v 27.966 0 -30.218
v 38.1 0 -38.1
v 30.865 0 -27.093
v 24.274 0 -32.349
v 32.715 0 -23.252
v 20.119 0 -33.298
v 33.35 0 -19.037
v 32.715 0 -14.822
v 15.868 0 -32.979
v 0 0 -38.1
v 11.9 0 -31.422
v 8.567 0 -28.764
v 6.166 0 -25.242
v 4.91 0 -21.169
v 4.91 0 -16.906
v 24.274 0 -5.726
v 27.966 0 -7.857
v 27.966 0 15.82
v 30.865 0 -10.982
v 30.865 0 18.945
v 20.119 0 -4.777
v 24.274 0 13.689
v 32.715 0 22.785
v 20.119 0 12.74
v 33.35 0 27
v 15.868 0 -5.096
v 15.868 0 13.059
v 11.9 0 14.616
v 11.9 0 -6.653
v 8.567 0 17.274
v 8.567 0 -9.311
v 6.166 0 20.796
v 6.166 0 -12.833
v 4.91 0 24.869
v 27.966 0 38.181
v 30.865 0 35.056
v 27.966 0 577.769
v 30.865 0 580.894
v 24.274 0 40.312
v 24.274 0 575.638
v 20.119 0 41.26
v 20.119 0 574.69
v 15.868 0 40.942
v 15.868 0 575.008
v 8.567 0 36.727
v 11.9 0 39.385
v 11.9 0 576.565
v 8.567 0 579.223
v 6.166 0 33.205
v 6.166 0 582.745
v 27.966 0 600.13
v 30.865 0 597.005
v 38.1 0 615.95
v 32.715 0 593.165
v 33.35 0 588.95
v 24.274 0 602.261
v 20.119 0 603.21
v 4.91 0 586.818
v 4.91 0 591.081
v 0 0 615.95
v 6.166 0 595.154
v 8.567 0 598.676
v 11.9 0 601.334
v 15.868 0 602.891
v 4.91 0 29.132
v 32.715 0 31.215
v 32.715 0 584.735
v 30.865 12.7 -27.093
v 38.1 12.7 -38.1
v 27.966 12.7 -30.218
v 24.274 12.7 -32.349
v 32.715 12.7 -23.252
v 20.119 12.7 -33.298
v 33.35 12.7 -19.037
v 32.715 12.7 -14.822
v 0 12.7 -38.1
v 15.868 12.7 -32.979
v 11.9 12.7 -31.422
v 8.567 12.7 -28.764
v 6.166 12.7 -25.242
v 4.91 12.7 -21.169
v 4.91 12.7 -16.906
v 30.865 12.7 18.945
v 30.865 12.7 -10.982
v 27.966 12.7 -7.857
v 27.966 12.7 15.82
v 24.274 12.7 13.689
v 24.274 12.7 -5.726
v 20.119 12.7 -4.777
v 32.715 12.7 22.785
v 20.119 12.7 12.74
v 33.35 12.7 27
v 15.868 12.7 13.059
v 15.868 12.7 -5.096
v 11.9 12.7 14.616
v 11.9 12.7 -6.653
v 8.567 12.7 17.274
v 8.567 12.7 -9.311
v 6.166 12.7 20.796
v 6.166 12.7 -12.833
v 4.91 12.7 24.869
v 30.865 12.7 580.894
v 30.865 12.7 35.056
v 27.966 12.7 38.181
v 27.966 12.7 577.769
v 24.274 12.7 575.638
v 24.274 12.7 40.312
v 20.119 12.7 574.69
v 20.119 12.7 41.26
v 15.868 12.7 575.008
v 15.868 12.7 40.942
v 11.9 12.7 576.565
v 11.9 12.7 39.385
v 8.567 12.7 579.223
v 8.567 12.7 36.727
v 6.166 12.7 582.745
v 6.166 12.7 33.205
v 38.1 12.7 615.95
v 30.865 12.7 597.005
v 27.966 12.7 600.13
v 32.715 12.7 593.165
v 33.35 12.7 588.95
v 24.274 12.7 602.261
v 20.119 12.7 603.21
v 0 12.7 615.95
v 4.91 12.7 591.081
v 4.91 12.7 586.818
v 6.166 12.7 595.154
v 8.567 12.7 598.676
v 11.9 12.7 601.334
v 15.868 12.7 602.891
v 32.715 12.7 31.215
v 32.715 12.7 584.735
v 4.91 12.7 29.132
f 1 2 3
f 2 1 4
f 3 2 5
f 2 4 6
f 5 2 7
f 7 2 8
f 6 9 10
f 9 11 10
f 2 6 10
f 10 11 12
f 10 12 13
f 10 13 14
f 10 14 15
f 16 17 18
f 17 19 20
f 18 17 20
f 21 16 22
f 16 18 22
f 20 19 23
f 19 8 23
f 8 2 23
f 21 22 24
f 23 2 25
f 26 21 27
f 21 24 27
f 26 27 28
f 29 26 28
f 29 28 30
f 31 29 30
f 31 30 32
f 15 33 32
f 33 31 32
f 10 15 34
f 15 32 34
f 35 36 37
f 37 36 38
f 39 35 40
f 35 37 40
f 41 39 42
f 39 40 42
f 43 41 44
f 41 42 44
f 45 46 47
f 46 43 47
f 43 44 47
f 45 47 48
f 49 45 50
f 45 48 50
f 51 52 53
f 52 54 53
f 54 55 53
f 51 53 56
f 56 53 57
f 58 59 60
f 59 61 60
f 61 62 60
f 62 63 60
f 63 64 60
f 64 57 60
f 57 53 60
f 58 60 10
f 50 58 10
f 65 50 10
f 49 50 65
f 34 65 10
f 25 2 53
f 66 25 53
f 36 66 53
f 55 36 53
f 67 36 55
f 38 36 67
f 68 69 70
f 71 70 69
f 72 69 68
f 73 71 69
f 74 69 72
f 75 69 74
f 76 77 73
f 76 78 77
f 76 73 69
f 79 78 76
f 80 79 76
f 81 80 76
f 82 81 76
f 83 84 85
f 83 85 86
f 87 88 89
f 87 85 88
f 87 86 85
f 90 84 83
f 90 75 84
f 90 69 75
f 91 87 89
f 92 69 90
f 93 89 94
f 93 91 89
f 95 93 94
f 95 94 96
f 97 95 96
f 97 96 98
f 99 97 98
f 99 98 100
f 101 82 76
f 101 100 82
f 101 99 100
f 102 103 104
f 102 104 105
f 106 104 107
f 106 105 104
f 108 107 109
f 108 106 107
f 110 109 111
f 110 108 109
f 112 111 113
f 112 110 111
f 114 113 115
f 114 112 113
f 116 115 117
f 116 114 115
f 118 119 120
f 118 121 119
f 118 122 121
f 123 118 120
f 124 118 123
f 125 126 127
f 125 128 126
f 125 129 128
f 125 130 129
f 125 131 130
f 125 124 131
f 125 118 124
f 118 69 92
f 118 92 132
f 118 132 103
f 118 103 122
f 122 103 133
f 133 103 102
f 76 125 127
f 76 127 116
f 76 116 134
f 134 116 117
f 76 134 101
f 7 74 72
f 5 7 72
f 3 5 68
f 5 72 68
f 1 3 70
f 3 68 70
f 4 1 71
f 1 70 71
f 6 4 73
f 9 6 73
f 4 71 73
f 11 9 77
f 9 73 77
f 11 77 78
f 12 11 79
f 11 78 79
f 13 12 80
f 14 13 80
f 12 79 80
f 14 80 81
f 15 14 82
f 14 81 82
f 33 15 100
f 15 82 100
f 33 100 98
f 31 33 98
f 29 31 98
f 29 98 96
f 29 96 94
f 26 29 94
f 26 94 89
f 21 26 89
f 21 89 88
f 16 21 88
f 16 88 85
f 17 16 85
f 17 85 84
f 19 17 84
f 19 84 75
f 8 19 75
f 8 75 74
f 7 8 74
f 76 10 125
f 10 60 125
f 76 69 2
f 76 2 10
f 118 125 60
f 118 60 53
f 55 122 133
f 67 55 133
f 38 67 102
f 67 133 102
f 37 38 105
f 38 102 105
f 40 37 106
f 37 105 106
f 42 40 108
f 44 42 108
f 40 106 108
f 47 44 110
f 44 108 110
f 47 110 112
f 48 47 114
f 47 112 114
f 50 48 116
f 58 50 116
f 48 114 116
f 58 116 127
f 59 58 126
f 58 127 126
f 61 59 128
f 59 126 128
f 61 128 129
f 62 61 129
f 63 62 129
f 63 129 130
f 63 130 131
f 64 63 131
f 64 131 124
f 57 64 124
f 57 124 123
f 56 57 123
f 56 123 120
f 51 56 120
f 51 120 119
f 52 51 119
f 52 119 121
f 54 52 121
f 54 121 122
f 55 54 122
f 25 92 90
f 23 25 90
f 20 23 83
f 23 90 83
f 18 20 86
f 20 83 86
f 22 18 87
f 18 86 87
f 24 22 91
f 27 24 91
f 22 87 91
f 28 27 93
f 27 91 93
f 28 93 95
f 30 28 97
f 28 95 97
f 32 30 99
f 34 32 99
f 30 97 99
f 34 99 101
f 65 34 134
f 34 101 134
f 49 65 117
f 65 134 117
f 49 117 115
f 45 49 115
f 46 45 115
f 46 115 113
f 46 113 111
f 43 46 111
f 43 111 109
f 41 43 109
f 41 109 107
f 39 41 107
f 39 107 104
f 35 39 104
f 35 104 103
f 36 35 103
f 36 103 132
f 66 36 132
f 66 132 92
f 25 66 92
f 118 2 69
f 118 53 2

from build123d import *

# Parameters (mm, degrees)
SKETCH1_W           = 38.1
SKETCH1_H           = 12.7
BOSS_EXTRUDE1_DEPTH = 615.95
SKETCH2_R           = 14.3002
CUT_EXTRUDE1_DEPTH  = 762
SKETCH3_W           = 38.1
SKETCH3_H           = 12.7
BOSS_EXTRUDE2_DEPTH = 38.1
SKETCH4_R           = 14.3002
CUT_EXTRUDE2_DEPTH  = 101.6


with BuildPart() as part:
    # Sketch1 → Boss-Extrude1 (new body)
    with BuildSketch(Plane.XY):
        with Locations((19.05, 6.35)):
            Rectangle(SKETCH1_W, SKETCH1_H)
    extrude(amount=BOSS_EXTRUDE1_DEPTH)

    # Sketch2 → Cut-Extrude1 (cut)
    with BuildSketch(Plane(origin=(0, 12.7, 0), x_dir=(1, 0, 0), z_dir=(0, 1, 0))):
        with Locations((19.05, -588.9498)):
            Circle(SKETCH2_R)
        with Locations((19.05, -27.0002)):
            Circle(SKETCH2_R)
    extrude(amount=-CUT_EXTRUDE1_DEPTH, mode=Mode.SUBTRACT)

    # Sketch3 → Boss-Extrude2 (add)
    with BuildSketch(Plane(origin=(0, 0, 0), x_dir=(-1, 0, 0), z_dir=(0, 0, -1))):
        with Locations((-19.05, 6.35)):
            Rectangle(SKETCH3_W, SKETCH3_H)
    extrude(amount=BOSS_EXTRUDE2_DEPTH)

    # Sketch4 → Cut-Extrude2 (cut)
    with BuildSketch(Plane(origin=(0, 12.7, 0), x_dir=(1, 0, 0), z_dir=(0, 1, 0))):
        with Locations((19.05, 19.0373)):
            Circle(SKETCH4_R)
    extrude(amount=-CUT_EXTRUDE2_DEPTH, mode=Mode.SUBTRACT)


solid = part.part
